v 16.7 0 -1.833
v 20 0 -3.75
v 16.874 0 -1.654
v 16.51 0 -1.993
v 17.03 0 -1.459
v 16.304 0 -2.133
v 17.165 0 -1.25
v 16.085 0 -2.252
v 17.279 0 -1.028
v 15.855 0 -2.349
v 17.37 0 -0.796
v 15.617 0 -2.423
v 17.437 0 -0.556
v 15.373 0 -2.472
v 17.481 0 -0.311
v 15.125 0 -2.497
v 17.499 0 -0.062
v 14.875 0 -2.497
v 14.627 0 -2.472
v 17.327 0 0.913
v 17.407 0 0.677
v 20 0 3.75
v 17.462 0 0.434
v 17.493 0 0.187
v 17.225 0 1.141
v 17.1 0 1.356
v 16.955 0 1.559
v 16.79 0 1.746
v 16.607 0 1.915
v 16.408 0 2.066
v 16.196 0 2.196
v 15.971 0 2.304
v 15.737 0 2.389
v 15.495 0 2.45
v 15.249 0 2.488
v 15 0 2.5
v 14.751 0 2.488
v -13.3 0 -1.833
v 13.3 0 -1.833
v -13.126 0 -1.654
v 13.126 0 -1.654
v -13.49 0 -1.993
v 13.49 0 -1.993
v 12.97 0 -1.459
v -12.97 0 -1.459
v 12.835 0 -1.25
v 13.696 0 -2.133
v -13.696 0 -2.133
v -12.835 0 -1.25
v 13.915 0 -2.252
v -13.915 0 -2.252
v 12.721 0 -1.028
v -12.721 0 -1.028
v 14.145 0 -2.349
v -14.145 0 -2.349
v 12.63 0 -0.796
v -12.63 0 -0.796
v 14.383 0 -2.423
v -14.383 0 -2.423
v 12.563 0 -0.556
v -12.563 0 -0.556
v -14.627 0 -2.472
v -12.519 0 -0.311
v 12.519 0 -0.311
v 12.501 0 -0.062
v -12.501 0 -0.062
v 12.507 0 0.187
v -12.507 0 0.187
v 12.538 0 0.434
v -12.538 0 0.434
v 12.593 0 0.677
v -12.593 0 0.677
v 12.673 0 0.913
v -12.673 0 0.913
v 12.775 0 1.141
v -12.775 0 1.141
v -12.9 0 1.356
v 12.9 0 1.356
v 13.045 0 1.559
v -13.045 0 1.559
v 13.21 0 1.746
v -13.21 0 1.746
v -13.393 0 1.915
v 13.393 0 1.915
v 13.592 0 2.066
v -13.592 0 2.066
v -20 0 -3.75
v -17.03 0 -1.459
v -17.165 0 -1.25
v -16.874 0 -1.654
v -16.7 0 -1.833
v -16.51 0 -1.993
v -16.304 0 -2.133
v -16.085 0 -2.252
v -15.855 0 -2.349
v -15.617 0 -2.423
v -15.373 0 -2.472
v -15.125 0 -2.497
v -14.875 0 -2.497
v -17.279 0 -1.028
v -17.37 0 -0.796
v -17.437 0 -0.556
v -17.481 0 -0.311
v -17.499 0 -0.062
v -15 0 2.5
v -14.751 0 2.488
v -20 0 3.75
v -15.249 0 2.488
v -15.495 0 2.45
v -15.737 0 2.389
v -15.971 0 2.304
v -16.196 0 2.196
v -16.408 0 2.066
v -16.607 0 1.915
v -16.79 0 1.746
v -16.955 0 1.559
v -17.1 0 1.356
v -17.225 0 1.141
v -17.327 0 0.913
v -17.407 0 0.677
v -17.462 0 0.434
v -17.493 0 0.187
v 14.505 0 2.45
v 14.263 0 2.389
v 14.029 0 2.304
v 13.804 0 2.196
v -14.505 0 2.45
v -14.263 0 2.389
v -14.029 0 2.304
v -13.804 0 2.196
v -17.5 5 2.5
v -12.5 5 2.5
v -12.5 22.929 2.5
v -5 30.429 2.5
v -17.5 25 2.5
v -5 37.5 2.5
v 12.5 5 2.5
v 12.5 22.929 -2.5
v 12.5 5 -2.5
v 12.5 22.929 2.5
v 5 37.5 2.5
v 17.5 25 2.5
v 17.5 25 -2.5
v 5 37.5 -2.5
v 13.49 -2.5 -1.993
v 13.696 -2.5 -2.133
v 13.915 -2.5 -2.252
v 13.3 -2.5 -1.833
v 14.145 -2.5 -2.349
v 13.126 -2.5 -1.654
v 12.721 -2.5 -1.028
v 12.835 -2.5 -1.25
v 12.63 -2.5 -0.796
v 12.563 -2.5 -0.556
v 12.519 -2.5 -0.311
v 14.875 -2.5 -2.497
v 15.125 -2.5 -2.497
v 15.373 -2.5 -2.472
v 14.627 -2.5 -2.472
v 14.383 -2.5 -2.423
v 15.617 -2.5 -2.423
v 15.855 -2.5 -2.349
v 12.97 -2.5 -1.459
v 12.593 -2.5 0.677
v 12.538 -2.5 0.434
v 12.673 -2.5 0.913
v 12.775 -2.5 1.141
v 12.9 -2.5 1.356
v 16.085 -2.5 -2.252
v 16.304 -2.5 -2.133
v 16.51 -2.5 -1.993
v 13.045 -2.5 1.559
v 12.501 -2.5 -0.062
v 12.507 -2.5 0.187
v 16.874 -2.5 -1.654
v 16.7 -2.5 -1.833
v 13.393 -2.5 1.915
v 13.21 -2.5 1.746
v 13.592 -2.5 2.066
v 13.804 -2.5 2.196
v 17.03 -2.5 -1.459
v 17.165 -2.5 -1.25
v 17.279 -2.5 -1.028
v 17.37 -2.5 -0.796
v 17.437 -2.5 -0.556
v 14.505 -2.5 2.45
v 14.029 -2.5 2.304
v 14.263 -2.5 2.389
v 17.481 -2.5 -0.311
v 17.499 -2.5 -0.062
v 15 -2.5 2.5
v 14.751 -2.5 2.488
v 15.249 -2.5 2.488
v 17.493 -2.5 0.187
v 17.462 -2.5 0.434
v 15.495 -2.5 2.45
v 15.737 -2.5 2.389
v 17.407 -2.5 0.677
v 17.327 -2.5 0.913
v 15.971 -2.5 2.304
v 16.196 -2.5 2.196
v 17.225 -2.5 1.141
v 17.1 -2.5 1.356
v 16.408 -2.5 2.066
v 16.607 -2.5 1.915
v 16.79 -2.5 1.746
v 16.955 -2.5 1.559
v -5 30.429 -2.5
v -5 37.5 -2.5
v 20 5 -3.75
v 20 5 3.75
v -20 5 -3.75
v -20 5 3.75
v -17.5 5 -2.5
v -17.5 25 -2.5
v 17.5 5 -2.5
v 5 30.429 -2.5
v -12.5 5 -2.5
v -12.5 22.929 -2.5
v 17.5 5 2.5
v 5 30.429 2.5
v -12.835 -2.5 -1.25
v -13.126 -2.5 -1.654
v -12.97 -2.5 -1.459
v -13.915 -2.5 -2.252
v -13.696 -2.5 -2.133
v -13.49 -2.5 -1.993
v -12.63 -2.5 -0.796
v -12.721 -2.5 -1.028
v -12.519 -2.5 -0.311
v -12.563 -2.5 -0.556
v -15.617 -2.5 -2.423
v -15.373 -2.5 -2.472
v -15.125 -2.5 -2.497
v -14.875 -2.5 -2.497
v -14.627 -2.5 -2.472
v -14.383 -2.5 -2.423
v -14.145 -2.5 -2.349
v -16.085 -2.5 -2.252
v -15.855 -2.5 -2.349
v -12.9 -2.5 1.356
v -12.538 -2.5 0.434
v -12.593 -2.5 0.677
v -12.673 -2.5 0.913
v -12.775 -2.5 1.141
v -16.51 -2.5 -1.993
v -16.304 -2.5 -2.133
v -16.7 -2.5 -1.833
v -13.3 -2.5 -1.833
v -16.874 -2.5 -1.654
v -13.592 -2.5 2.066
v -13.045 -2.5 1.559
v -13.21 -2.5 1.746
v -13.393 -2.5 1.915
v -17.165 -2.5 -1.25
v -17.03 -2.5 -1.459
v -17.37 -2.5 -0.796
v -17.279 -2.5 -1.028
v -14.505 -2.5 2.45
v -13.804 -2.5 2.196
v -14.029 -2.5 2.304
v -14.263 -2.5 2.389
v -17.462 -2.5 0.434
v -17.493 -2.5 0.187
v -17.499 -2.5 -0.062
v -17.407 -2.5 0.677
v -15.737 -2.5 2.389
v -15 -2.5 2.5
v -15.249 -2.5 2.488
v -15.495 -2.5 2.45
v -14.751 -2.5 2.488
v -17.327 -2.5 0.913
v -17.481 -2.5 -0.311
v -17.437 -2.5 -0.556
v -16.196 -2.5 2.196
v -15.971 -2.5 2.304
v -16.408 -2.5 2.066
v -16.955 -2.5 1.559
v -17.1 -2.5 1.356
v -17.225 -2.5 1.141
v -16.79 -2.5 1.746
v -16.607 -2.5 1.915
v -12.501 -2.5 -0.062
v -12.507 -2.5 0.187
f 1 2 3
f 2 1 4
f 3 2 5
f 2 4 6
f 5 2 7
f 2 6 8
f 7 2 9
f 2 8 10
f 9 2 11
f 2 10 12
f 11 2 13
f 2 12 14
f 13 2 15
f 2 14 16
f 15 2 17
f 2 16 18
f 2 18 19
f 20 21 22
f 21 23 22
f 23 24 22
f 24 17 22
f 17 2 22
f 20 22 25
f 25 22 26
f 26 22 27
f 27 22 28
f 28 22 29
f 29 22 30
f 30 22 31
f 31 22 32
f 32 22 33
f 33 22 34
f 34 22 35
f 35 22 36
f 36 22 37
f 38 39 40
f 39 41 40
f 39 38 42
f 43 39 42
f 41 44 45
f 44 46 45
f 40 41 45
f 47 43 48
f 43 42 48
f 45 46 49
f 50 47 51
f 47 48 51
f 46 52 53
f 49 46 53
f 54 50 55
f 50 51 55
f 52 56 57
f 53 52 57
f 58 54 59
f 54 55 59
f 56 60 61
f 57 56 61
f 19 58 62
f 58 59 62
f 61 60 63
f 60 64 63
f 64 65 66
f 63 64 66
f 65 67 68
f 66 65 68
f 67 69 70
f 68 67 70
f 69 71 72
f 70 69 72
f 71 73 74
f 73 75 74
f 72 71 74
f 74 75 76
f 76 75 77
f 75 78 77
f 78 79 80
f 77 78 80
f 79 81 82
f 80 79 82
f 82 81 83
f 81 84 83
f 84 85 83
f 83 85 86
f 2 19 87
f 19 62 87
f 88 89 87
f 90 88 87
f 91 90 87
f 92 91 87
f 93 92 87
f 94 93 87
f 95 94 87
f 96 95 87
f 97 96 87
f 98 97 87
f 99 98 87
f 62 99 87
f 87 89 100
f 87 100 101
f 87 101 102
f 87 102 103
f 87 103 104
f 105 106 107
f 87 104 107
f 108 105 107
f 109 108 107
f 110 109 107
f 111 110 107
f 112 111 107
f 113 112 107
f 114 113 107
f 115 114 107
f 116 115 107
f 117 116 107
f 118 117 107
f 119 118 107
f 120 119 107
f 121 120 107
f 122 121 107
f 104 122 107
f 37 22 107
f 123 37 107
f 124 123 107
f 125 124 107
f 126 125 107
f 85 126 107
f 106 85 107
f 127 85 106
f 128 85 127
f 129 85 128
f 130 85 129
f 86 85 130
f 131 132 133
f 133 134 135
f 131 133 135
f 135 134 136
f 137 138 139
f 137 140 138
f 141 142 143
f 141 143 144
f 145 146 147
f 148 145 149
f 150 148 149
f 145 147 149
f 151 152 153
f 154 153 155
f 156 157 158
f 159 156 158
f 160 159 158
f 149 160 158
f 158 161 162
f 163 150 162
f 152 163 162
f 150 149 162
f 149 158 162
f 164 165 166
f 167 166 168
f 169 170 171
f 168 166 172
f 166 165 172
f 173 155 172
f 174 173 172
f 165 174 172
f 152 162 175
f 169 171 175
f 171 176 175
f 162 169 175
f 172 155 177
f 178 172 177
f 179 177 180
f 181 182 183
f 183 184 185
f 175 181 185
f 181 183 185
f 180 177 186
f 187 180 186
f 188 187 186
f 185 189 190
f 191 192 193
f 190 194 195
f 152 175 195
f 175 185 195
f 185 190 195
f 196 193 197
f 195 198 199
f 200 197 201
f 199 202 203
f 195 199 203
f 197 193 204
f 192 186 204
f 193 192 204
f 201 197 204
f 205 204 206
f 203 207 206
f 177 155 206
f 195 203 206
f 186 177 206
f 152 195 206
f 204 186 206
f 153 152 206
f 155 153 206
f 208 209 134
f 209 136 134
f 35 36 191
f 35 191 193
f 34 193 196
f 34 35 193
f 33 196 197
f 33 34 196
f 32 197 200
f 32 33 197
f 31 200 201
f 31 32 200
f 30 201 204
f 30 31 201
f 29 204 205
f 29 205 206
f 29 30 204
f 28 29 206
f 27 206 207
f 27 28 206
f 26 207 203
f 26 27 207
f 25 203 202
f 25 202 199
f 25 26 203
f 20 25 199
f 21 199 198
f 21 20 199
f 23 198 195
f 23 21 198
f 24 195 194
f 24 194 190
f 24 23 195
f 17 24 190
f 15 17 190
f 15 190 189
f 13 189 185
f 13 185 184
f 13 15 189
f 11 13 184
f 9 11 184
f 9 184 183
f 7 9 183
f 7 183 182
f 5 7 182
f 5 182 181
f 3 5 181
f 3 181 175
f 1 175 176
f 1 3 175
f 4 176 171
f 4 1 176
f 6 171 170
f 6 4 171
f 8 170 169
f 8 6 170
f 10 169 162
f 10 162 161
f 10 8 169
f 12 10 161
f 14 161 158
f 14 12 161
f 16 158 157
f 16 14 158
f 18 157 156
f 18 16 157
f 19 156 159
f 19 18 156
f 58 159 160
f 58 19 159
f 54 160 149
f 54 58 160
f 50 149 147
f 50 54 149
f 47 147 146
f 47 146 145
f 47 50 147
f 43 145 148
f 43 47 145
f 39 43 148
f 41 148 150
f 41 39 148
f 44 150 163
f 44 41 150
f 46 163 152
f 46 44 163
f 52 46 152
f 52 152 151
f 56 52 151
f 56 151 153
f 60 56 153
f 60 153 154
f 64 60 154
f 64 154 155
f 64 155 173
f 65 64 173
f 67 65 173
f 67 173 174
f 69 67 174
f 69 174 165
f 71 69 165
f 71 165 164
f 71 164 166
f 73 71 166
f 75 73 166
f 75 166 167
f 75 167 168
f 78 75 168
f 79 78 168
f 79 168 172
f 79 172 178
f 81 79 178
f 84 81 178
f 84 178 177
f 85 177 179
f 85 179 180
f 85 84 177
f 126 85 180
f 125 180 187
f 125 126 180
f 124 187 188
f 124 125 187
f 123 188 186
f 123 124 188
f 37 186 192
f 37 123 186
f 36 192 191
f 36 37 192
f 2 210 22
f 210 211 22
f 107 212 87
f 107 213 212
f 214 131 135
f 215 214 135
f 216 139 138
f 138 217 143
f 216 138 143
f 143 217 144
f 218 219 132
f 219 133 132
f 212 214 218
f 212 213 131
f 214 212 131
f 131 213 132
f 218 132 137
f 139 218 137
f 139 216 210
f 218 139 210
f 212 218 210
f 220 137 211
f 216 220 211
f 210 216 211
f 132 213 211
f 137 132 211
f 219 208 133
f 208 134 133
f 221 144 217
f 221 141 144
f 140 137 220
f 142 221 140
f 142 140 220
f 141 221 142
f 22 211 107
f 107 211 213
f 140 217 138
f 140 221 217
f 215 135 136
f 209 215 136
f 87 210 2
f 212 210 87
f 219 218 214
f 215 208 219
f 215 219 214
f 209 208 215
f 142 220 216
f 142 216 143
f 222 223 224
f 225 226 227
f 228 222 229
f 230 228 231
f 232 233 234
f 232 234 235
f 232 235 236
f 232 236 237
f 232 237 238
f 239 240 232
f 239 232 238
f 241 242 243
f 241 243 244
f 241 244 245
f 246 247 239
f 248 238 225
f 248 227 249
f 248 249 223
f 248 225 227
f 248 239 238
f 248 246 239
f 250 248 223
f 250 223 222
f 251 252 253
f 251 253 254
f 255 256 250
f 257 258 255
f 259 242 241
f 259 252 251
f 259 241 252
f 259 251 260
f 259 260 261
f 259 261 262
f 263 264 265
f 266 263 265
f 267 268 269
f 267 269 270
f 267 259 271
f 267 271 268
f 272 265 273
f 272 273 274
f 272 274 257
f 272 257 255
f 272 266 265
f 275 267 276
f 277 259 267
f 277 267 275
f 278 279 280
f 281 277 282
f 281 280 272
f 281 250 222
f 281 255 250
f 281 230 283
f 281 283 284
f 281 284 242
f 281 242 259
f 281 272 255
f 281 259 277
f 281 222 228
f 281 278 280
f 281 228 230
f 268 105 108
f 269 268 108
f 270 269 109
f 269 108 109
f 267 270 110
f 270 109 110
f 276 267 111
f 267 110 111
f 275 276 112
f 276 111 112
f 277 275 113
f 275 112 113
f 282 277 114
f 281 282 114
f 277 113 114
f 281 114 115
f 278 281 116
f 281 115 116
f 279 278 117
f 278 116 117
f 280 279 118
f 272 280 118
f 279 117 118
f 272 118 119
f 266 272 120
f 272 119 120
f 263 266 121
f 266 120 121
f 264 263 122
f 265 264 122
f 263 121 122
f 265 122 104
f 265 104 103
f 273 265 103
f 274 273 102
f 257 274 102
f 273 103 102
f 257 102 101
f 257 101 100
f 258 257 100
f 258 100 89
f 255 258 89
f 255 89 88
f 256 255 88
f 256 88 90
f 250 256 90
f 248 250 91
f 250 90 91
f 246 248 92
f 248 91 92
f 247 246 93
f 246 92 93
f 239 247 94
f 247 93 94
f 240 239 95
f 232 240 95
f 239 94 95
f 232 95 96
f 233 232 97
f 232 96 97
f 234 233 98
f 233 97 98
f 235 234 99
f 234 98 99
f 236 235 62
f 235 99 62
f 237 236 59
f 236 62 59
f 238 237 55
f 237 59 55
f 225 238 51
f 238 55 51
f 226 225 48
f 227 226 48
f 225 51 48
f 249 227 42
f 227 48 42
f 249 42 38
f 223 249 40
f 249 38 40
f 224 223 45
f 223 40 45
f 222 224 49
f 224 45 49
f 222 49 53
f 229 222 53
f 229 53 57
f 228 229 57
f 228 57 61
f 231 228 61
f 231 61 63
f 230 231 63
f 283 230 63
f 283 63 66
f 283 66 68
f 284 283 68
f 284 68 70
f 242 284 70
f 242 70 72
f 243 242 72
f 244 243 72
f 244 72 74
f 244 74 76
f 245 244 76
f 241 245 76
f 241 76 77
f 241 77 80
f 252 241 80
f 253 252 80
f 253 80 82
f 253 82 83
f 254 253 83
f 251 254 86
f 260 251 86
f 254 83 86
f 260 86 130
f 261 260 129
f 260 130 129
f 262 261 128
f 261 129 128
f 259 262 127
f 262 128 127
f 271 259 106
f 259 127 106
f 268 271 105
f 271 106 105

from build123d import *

# Parameters (mm, degrees)
BOSS_EXTRUDE1_DEPTH = 2.5
BOSS_EXTRUDE2_DEPTH = 3.75
SKETCH3_R           = 2.5
BOSS_EXTRUDE3_DEPTH = 2.5


with BuildPart() as part:
    # Sketch1 → Boss-Extrude1 (new, symmetric)
    with BuildSketch(Plane.XY):
        Polygon((-17.5, 25), (-17.5, 5), (-12.5, 5), (-12.5, 22.928932188), (-5, 30.428932188), (-5, 37.5), align=None)
    boss_extrude1 = extrude(amount=BOSS_EXTRUDE1_DEPTH, both=True)

    # Sketch1<3> → Boss-Extrude2 (add, symmetric)
    with BuildSketch(Plane.XY):
        Polygon((-20, 5), (-20, 0), (0, 0), (0, 5), (-12.5, 5), (-17.5, 5), align=None)
    boss_extrude2 = extrude(amount=BOSS_EXTRUDE2_DEPTH, both=True)

    # Sketch3 → Boss-Extrude3 (add)
    with BuildSketch(Plane.XZ):
        with Locations((-15, 0)):
            Circle(SKETCH3_R)
    boss_extrude3 = extrude(amount=BOSS_EXTRUDE3_DEPTH)

    # Mirror1: Boss-Extrude1, Boss-Extrude2, Boss-Extrude3 across plane
    add(boss_extrude1.mirror(Plane(origin=(0, 0, 0), x_dir=(0, 0, 1), z_dir=(1, 0, 0))))
    add(boss_extrude2.mirror(Plane(origin=(0, 0, 0), x_dir=(0, 0, 1), z_dir=(1, 0, 0))))
    add(boss_extrude3.mirror(Plane(origin=(0, 0, 0), x_dir=(0, 0, 1), z_dir=(1, 0, 0))))


solid = part.part
